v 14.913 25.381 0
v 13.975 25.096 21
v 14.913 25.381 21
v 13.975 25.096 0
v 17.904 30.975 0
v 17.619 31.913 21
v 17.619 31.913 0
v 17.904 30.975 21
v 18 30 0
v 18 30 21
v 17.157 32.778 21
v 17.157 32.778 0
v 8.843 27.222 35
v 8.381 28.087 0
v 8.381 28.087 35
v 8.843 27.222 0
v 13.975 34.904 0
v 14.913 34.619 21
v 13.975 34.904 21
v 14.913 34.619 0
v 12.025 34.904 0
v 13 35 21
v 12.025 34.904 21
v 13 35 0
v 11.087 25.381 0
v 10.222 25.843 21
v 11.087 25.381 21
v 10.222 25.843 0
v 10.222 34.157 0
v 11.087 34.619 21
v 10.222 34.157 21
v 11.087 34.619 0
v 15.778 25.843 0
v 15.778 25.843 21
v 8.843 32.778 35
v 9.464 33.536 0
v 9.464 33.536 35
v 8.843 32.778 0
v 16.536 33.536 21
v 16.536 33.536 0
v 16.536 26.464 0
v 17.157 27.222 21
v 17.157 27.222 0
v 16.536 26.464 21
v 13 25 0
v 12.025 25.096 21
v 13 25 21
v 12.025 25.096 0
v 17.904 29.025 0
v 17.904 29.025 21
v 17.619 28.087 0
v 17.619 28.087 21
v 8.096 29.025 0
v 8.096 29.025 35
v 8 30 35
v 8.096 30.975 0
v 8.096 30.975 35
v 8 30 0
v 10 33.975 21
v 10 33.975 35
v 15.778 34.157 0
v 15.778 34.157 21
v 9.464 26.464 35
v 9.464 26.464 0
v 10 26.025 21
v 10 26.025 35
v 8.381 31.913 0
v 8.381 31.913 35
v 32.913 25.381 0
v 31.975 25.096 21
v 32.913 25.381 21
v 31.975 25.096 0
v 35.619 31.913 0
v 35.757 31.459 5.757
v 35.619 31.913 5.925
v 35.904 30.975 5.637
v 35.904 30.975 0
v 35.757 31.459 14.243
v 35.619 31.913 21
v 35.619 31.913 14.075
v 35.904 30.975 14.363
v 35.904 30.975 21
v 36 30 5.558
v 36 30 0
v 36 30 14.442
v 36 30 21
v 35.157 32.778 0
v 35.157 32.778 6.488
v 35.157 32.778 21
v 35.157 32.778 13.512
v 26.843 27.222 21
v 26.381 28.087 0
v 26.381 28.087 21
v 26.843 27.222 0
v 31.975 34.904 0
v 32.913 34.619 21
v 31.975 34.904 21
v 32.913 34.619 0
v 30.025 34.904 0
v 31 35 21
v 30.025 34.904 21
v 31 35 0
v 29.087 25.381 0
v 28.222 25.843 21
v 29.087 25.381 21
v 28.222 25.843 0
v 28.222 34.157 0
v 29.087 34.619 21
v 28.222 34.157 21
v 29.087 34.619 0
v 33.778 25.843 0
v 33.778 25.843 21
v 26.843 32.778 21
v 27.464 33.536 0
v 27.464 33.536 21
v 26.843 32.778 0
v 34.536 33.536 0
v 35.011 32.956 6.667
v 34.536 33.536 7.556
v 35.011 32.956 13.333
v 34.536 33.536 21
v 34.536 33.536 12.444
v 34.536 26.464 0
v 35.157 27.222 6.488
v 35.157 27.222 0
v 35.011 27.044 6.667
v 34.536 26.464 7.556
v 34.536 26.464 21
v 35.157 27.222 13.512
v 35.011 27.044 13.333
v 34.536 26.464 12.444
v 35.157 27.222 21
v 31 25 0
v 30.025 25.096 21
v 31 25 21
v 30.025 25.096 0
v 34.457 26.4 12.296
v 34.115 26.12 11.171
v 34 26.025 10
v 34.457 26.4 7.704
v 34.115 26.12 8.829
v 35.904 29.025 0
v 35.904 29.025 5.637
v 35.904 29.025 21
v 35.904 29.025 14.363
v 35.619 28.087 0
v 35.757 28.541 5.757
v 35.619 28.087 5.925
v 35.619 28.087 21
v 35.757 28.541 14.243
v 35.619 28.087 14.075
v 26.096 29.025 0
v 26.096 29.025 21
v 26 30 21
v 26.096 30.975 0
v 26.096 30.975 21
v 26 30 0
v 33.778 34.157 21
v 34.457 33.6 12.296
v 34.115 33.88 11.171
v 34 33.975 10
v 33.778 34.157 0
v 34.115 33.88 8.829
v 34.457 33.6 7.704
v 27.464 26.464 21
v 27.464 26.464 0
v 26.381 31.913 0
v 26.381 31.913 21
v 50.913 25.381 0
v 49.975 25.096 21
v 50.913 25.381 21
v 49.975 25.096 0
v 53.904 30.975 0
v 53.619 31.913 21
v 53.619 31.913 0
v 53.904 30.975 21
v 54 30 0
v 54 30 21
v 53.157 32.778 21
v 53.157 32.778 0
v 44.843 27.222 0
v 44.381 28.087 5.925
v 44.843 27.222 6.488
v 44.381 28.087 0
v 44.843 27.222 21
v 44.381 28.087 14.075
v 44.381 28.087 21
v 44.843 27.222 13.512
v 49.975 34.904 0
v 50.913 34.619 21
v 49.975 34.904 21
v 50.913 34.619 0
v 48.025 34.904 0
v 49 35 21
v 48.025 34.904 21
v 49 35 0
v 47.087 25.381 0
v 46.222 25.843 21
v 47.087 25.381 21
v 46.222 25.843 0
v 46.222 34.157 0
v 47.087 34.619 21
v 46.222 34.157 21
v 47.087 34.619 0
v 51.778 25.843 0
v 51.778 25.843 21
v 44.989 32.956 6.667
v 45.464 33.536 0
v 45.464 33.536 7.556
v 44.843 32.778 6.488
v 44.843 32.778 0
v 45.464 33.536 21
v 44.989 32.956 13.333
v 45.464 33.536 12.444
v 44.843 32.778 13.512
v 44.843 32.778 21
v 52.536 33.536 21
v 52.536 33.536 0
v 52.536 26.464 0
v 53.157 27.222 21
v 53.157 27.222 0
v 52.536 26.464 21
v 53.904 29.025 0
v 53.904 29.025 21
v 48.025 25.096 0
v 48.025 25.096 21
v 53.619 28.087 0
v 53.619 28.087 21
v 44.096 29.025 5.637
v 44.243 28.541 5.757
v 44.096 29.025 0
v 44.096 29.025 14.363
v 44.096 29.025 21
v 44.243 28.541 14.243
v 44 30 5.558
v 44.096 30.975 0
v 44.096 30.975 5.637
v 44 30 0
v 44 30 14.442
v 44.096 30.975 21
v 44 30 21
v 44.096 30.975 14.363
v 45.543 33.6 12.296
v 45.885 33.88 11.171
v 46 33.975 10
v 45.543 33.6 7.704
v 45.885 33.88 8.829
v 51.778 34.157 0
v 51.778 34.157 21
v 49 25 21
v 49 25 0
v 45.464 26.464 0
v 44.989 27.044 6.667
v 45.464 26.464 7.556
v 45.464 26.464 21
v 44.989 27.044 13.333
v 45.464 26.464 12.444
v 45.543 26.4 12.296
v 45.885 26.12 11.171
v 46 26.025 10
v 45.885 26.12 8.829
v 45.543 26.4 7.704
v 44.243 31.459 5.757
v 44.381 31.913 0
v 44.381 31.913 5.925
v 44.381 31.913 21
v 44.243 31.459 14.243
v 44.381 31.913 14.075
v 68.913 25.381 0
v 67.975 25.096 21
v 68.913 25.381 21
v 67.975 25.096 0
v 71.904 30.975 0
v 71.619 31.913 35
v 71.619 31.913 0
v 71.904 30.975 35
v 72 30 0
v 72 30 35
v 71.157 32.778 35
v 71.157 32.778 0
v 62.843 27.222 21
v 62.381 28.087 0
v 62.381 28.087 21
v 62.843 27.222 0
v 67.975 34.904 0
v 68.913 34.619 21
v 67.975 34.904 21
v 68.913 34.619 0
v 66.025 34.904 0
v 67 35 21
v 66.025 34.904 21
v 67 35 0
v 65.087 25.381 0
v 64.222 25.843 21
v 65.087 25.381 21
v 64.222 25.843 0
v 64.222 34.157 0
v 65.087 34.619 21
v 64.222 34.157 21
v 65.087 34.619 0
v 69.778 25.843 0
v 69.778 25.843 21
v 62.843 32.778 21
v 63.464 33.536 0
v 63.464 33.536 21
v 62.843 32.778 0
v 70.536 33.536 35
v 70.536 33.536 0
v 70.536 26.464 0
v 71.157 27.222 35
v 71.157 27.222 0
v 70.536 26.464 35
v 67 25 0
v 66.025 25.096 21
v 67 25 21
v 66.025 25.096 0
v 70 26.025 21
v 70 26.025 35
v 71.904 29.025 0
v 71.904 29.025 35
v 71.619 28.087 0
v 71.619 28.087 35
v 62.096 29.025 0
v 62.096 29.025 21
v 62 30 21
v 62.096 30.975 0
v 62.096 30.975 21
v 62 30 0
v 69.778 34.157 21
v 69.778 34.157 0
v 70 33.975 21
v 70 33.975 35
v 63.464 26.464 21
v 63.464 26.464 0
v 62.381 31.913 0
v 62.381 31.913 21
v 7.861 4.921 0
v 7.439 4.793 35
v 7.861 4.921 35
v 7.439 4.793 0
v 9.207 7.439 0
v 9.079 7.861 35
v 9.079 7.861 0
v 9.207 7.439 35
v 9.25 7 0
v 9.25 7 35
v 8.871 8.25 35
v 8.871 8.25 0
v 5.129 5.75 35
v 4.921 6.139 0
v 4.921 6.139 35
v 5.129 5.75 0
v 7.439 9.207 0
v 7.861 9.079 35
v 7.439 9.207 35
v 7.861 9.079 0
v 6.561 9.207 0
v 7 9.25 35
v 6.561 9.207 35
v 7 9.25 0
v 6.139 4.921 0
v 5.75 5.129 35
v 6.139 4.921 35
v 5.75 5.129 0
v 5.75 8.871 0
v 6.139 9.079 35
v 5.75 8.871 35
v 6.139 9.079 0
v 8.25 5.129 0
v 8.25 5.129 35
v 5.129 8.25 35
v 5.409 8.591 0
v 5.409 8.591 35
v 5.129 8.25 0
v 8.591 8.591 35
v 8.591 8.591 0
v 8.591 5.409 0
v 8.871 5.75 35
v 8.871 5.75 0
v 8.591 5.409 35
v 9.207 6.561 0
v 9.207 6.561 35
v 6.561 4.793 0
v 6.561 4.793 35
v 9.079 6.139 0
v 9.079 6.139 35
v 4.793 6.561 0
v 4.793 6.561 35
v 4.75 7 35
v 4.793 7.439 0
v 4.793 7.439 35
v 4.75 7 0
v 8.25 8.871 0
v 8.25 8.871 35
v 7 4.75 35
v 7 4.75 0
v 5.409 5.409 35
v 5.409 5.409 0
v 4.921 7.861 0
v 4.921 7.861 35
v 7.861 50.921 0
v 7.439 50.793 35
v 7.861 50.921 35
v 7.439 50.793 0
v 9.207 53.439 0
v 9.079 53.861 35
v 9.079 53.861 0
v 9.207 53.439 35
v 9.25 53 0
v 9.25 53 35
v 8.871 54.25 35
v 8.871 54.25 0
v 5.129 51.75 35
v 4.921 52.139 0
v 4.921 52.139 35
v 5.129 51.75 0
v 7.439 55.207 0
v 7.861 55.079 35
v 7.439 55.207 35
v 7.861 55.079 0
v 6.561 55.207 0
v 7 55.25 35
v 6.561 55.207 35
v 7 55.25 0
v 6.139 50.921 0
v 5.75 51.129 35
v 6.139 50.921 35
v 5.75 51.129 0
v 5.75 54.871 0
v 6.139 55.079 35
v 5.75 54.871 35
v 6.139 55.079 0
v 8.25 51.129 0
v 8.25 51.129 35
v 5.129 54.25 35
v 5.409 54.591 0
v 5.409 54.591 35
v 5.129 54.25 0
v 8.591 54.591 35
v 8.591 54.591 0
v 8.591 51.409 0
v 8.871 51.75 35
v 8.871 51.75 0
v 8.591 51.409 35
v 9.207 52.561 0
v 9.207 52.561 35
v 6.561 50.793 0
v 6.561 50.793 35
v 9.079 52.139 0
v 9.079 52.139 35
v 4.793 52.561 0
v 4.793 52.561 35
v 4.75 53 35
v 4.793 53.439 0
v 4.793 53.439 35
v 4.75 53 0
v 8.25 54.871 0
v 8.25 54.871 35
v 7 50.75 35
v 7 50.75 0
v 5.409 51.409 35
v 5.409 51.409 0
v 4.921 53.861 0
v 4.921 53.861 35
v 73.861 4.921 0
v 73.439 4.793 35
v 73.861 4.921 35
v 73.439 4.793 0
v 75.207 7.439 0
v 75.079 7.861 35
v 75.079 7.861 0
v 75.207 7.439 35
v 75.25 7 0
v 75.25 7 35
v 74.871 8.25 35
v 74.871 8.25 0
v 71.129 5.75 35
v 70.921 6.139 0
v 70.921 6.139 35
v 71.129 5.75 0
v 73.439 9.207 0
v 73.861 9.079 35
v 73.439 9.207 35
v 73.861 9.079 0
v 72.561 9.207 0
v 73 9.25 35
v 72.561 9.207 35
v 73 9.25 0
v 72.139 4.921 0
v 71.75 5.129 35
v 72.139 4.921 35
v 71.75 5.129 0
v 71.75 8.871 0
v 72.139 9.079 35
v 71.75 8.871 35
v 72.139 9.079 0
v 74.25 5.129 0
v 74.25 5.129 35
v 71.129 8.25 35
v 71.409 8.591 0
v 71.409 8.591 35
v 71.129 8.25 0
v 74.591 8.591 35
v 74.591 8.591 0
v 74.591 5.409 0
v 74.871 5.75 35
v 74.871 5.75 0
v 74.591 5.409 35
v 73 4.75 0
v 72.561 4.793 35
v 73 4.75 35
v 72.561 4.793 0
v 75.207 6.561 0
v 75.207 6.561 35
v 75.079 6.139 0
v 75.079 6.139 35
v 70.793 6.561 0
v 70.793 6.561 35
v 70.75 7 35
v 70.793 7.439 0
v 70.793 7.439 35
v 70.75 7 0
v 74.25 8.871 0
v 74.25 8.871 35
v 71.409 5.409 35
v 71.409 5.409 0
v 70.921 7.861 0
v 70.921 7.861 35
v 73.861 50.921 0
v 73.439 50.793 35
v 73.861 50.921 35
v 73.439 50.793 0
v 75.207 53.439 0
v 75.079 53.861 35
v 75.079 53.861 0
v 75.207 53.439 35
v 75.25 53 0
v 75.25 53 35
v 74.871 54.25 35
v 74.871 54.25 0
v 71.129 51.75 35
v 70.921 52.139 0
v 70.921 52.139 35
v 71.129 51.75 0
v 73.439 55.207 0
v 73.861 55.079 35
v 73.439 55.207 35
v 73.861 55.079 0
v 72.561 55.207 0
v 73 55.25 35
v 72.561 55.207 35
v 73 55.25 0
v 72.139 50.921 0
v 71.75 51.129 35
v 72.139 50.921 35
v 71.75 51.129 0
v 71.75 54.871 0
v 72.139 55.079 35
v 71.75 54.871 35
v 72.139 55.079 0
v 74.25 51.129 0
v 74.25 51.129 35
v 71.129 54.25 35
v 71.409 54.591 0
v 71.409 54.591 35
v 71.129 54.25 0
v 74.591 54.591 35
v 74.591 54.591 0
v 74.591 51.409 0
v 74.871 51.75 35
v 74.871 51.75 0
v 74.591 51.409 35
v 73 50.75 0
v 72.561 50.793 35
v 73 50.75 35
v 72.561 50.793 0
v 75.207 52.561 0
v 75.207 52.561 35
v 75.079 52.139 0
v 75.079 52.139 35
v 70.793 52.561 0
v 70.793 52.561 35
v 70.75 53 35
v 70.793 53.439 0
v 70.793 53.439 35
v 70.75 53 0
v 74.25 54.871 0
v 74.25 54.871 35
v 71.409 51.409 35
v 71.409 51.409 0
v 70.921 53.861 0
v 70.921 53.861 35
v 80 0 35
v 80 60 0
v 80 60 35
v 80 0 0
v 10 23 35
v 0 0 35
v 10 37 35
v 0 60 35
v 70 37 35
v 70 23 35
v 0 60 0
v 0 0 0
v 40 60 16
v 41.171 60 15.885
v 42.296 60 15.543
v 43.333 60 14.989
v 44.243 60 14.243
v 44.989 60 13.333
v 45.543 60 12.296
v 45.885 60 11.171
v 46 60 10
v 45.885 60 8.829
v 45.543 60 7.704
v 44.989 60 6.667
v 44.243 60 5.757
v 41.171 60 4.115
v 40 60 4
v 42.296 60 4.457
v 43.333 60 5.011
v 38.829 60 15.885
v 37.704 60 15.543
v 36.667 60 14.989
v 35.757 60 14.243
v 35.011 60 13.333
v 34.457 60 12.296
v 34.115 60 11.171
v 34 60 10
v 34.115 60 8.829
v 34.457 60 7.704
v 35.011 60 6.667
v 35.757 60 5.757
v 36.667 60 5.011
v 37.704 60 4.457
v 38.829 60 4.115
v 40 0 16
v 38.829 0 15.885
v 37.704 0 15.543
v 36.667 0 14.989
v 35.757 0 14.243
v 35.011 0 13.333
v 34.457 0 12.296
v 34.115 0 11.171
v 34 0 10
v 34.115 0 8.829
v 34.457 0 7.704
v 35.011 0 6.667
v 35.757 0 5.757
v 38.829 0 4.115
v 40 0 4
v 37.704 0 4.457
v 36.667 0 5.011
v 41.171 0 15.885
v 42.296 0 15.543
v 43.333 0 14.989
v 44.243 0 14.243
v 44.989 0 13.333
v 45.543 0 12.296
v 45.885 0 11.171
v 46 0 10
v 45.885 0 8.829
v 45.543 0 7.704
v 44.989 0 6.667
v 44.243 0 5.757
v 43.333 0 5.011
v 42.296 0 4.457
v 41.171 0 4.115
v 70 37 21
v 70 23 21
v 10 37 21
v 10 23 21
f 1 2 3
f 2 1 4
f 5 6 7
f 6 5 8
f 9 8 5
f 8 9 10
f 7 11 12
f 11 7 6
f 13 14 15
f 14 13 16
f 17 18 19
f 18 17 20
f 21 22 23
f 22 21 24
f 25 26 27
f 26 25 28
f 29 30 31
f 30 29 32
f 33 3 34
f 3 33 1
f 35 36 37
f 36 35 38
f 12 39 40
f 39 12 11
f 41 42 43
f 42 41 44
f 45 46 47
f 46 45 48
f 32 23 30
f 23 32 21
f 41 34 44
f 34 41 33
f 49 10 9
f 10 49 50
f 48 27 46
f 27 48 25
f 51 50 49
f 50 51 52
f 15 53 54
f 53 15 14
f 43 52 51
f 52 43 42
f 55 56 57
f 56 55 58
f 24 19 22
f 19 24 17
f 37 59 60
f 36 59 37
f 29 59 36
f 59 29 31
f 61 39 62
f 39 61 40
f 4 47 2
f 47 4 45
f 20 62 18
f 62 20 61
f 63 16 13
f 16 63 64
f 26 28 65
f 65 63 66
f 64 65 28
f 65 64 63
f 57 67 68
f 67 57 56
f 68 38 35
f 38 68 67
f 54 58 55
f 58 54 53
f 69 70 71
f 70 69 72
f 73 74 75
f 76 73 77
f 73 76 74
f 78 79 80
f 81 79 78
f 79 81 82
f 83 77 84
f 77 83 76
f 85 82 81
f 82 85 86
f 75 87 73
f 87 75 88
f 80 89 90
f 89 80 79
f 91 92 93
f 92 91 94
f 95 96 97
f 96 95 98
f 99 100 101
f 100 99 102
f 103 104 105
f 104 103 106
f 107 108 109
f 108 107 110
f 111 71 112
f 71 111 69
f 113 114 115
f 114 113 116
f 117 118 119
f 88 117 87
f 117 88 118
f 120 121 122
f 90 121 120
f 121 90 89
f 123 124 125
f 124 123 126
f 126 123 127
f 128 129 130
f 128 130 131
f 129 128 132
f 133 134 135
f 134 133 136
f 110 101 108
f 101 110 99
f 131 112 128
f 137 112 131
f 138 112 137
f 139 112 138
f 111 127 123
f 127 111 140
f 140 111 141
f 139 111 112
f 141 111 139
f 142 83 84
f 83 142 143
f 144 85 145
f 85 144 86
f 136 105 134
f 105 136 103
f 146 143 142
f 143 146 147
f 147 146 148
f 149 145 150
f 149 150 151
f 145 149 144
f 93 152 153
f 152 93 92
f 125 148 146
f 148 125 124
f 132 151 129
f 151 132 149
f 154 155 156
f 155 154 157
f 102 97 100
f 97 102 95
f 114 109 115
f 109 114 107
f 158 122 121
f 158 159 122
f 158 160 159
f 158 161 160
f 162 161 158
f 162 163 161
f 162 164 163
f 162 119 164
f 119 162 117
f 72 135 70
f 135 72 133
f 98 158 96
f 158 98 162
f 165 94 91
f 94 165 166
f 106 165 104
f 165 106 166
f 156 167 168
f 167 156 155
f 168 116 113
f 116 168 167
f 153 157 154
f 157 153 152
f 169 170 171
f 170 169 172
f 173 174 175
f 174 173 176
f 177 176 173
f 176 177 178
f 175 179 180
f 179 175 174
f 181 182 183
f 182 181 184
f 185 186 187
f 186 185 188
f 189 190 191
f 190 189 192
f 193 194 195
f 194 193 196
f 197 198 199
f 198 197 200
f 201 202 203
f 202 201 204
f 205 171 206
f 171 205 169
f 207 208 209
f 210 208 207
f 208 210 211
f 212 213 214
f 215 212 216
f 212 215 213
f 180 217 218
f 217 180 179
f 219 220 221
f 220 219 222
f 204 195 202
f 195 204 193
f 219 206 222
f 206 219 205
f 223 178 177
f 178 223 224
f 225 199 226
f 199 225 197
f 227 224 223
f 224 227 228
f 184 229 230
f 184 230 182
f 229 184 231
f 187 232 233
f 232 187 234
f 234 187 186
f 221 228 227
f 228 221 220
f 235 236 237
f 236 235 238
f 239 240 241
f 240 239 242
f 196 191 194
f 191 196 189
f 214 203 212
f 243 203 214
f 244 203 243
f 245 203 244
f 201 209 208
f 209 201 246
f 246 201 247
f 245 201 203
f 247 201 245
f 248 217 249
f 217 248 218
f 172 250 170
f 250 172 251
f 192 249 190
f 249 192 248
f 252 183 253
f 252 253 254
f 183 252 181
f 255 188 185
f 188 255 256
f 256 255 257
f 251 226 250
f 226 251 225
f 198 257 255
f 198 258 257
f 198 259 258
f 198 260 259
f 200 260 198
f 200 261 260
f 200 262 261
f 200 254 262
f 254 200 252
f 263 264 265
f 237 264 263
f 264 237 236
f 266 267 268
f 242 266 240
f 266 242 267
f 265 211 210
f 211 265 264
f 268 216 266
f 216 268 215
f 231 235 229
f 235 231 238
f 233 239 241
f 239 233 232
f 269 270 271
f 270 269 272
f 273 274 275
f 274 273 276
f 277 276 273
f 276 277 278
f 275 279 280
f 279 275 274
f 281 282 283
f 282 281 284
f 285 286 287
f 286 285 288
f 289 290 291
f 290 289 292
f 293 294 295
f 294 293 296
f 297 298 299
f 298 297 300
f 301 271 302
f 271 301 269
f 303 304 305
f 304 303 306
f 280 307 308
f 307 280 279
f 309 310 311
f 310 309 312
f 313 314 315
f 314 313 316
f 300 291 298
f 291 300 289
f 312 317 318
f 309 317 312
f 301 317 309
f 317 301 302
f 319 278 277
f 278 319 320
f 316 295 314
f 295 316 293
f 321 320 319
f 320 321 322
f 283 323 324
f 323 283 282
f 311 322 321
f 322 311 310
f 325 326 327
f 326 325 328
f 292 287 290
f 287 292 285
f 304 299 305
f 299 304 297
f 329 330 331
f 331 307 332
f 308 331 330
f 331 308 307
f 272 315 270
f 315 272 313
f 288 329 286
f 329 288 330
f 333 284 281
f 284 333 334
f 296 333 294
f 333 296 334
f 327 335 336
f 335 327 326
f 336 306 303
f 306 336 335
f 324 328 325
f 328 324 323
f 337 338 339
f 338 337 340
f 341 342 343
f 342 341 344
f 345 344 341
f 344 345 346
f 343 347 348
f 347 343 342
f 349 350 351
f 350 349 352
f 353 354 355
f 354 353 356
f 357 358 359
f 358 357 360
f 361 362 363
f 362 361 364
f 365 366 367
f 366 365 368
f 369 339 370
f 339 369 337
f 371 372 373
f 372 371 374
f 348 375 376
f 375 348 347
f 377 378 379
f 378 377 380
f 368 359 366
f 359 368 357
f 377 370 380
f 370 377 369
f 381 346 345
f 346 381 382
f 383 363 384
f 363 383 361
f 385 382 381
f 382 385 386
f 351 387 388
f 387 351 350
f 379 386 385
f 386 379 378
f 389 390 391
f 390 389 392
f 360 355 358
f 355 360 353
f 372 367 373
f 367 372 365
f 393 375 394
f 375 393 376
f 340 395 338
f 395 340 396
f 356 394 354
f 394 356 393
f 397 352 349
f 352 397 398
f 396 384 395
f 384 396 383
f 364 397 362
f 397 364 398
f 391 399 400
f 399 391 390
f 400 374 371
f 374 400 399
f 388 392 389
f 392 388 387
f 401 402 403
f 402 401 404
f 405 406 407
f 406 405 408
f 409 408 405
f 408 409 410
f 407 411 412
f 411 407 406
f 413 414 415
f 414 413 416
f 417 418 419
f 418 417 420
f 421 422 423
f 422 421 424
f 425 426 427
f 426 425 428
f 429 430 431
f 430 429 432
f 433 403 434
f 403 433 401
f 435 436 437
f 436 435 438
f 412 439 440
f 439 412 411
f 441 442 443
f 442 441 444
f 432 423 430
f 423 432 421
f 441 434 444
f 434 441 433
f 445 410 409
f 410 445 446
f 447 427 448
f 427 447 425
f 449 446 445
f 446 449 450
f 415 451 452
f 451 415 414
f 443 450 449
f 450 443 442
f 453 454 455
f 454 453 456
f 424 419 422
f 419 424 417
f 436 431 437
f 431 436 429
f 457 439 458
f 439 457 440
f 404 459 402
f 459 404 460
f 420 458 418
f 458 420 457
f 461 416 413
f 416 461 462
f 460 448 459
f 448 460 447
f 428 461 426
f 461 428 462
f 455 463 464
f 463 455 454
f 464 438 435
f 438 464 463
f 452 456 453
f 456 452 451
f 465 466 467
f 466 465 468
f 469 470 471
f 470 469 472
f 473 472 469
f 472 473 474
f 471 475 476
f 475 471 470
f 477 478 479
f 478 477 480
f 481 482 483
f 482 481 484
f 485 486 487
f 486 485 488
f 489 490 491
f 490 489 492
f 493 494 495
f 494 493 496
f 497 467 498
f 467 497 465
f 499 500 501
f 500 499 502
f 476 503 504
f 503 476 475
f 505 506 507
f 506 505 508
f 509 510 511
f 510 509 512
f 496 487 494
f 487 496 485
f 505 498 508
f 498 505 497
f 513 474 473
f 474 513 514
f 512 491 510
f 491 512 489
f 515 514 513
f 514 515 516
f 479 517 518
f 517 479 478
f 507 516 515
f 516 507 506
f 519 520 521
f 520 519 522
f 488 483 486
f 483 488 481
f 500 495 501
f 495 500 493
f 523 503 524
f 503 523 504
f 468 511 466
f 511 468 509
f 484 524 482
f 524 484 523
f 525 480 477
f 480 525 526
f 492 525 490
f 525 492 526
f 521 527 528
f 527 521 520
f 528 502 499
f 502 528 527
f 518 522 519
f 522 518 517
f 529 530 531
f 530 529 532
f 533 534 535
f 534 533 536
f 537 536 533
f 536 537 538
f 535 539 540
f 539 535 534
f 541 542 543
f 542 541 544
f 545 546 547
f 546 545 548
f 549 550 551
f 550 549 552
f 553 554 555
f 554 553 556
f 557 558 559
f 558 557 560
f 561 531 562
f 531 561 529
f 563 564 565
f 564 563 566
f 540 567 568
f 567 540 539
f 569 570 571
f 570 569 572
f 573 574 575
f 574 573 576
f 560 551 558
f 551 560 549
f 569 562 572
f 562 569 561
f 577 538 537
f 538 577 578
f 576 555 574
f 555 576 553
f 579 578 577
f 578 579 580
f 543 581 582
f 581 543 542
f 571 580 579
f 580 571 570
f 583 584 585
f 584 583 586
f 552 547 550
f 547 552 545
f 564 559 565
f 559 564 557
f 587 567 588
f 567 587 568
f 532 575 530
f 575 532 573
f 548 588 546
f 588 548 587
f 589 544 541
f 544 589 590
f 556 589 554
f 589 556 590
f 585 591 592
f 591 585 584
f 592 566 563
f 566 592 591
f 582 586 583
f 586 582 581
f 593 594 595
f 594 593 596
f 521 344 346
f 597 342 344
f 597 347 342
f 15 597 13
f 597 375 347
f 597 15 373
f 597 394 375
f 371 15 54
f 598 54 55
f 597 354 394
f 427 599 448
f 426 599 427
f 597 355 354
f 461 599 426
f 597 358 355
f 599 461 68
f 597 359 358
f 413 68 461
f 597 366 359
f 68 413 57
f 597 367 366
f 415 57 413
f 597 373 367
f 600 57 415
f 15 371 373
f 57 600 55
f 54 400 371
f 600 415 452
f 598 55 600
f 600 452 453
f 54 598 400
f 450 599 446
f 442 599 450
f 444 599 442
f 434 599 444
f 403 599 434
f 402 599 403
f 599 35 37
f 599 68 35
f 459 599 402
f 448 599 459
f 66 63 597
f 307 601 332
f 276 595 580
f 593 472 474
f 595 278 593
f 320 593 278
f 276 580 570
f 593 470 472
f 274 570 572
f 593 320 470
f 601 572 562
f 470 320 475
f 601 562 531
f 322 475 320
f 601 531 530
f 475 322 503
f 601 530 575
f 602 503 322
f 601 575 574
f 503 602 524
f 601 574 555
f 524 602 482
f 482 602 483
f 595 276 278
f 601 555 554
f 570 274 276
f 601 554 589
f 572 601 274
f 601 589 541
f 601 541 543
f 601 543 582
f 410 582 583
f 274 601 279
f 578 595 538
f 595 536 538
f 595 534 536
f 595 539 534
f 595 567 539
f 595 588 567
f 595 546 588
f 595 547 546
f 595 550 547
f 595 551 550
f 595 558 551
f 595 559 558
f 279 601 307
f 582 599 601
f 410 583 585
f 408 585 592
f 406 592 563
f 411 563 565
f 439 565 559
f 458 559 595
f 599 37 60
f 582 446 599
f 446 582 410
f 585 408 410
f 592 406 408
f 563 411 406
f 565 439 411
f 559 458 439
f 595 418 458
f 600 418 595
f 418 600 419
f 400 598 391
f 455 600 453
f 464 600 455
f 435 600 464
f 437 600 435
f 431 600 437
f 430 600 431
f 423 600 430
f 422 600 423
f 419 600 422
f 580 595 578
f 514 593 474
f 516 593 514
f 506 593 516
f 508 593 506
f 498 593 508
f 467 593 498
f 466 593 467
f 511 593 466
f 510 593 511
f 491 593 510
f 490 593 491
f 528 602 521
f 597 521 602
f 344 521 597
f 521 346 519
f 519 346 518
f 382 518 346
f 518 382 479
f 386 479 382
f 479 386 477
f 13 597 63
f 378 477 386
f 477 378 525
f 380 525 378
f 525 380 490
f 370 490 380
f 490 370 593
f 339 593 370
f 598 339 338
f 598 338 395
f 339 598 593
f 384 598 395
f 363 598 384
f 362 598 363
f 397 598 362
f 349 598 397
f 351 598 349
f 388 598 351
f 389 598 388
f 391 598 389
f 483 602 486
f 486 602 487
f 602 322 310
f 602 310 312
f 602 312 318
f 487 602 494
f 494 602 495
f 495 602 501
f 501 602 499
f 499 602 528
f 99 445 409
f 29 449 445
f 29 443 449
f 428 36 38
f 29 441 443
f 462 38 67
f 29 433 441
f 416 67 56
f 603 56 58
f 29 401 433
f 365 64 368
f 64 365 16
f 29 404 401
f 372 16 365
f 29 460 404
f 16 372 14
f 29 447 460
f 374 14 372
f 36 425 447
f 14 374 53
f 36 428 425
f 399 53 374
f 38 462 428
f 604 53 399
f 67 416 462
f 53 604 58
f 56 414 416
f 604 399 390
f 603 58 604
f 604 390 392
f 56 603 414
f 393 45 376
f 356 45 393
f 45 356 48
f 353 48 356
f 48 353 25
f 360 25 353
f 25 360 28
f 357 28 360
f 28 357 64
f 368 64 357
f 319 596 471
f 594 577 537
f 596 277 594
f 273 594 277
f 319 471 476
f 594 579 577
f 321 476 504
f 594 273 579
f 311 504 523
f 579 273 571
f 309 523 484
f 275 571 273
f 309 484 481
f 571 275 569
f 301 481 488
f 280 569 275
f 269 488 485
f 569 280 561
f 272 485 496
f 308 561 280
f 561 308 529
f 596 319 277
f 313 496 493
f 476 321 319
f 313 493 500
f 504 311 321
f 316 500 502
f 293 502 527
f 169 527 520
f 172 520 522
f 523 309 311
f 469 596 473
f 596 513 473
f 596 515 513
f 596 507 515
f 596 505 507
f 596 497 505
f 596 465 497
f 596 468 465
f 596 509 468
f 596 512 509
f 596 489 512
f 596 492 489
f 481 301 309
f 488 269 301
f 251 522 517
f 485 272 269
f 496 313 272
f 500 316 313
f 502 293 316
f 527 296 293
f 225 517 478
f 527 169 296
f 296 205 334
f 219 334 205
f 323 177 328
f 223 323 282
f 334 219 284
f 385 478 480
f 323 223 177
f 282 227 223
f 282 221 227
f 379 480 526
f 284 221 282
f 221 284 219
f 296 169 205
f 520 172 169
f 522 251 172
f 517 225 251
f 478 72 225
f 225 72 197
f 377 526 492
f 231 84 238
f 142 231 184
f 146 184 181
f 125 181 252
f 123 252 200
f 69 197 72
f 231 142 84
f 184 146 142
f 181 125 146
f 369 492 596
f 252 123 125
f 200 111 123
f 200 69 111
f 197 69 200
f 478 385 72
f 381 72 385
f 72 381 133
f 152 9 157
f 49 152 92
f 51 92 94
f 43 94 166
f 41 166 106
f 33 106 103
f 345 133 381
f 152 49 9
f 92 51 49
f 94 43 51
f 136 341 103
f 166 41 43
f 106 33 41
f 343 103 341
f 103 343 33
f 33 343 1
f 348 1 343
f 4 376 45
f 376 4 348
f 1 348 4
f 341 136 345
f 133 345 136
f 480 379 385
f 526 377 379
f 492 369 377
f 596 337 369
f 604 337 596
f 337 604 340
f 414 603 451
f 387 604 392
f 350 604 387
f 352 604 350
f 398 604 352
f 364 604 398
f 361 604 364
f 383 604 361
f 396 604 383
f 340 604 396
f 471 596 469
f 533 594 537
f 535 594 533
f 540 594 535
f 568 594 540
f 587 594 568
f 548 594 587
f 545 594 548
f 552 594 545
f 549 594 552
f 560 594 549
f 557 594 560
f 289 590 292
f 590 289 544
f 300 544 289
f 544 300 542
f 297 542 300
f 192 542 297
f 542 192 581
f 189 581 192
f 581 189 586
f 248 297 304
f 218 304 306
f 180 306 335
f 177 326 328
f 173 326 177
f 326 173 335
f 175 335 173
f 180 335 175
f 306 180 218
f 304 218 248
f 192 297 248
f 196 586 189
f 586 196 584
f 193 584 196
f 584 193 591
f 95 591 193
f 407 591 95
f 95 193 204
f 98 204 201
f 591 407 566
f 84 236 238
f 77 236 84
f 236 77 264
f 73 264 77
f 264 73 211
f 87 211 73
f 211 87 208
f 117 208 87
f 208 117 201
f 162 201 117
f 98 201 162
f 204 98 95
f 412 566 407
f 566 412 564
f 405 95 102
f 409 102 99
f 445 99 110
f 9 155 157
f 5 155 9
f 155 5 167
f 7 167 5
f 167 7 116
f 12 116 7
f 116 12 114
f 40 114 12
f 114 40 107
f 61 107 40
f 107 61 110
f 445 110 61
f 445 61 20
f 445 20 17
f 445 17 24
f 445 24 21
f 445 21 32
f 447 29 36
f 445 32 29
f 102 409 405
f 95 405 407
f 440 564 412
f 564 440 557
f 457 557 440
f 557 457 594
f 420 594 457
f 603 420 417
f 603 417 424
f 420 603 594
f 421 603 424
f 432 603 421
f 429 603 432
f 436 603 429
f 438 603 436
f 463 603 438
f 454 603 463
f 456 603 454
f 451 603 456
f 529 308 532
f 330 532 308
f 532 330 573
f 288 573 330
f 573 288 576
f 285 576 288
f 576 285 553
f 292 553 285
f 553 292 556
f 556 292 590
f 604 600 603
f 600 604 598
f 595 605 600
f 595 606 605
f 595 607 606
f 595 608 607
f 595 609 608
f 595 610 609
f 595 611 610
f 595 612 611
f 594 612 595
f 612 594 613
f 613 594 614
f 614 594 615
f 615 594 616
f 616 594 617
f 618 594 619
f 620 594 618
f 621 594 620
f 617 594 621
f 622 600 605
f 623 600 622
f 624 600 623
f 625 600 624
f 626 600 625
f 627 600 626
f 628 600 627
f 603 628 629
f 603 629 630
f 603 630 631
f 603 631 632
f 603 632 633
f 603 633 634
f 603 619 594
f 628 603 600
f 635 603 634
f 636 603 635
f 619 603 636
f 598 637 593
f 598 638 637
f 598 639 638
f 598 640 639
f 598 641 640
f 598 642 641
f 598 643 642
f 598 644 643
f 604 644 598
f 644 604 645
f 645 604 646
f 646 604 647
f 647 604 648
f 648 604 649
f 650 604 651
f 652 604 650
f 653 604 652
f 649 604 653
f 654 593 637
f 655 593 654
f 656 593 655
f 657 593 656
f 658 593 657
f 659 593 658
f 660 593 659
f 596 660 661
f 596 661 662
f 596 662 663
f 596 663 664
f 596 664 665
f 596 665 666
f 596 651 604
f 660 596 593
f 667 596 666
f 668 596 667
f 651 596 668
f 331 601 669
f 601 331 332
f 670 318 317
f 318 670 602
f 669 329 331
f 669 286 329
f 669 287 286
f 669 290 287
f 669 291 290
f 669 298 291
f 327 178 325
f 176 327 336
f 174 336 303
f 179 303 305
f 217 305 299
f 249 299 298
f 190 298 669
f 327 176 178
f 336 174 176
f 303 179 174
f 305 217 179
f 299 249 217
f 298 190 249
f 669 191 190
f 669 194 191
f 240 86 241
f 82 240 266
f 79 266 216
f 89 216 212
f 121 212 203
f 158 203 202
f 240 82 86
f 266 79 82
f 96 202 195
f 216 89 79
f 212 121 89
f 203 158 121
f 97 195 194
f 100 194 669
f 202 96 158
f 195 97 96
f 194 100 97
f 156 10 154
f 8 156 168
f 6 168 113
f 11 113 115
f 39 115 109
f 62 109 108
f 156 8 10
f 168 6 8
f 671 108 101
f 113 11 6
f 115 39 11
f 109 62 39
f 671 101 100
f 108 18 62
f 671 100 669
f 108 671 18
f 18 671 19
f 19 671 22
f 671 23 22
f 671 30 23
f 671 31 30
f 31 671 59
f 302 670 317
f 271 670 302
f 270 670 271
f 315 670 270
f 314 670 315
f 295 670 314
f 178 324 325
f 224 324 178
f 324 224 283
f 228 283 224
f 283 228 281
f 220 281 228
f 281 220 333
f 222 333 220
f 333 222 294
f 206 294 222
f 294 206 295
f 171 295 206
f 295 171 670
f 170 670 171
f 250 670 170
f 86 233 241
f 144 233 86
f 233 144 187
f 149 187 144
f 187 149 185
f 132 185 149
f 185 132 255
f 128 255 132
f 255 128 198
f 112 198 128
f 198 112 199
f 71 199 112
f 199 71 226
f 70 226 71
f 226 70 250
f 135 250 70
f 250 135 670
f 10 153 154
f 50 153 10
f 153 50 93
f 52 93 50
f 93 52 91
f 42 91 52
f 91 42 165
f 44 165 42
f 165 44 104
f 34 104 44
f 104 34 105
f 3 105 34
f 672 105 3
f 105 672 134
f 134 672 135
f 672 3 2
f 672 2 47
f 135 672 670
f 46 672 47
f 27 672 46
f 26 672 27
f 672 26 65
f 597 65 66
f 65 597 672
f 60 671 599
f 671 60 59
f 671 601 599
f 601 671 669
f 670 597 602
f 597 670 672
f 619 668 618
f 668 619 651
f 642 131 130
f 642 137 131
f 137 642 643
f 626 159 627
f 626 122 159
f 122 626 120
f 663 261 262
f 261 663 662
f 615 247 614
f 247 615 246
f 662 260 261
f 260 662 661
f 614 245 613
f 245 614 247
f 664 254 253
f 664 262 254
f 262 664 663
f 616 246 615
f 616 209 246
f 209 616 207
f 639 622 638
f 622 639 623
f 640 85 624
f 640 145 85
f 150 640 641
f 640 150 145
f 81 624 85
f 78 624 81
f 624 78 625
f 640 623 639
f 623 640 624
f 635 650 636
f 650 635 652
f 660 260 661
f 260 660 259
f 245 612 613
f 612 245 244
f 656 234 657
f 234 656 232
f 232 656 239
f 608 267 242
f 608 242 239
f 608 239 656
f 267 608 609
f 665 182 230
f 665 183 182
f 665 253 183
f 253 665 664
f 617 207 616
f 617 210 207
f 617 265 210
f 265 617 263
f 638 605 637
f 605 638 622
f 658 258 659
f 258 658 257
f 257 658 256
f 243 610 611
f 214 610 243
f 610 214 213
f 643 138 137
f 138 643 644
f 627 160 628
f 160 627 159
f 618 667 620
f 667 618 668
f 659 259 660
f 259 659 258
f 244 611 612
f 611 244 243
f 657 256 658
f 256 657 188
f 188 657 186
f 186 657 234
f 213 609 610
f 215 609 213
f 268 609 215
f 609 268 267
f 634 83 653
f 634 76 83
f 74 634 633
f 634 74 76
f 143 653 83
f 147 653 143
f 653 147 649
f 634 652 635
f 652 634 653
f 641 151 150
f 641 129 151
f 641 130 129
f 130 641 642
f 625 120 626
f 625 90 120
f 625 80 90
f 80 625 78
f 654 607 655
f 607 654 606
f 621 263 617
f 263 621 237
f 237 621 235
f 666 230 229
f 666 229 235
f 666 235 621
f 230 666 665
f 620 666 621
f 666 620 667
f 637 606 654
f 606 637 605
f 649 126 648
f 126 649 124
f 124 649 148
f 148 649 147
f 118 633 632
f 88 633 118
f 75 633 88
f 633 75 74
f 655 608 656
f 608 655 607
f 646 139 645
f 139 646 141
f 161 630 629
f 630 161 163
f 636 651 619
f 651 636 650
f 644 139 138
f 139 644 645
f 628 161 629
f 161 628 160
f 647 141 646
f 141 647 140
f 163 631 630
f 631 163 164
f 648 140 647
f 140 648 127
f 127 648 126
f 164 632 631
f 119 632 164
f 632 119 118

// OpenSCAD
$fn = 32;

// ----------------------------------------------------------------------
// Manifold block: side_outlet manifold
// ----------------------------------------------------------------------

// --- parameters (mm) ---
block_l = 80;             // block length, X
block_w = 60;             // block width, Y
block_h = 35;             // block height, Z
port_d = 10;              // port bore diameter
port_pitch = 18;          // port pitch along X
gallery_d = 14;           // top gallery width, Y
gallery_depth = 14;       // gallery pocket depth
wall_p = 10;              // gallery end wall thickness, X
mnt_d = 4.5;              // mounting hole diameter
mnt_in = 7;               // mounting hole inset from the edges
out_d = 12;               // outlet bore diameter
out_z = 10;               // outlet axis height

n_ports = 4;  // ports in the row
port_x0 = (block_l - (n_ports - 1) * port_pitch) / 2;  // first port X

difference() {
  cube([block_l, block_w, block_h]);
  for (i = [0 : n_ports - 1])
    translate([port_x0 + i * port_pitch, block_w / 2, -1])
      cylinder(h = block_h + 2, d = port_d);
  translate([wall_p, block_w / 2 - gallery_d / 2, block_h - gallery_depth])
    cube([block_l - 2 * wall_p, gallery_d, gallery_depth + 1]);
  for (cx = [mnt_in, block_l - mnt_in])
    for (cy = [mnt_in, block_w - mnt_in])
      translate([cx, cy, -1]) cylinder(h = block_h + 2, d = mnt_d);
  translate([block_l / 2, -1, out_z]) rotate([-90, 0, 0])
    cylinder(h = block_w + 2, d = out_d);
}
